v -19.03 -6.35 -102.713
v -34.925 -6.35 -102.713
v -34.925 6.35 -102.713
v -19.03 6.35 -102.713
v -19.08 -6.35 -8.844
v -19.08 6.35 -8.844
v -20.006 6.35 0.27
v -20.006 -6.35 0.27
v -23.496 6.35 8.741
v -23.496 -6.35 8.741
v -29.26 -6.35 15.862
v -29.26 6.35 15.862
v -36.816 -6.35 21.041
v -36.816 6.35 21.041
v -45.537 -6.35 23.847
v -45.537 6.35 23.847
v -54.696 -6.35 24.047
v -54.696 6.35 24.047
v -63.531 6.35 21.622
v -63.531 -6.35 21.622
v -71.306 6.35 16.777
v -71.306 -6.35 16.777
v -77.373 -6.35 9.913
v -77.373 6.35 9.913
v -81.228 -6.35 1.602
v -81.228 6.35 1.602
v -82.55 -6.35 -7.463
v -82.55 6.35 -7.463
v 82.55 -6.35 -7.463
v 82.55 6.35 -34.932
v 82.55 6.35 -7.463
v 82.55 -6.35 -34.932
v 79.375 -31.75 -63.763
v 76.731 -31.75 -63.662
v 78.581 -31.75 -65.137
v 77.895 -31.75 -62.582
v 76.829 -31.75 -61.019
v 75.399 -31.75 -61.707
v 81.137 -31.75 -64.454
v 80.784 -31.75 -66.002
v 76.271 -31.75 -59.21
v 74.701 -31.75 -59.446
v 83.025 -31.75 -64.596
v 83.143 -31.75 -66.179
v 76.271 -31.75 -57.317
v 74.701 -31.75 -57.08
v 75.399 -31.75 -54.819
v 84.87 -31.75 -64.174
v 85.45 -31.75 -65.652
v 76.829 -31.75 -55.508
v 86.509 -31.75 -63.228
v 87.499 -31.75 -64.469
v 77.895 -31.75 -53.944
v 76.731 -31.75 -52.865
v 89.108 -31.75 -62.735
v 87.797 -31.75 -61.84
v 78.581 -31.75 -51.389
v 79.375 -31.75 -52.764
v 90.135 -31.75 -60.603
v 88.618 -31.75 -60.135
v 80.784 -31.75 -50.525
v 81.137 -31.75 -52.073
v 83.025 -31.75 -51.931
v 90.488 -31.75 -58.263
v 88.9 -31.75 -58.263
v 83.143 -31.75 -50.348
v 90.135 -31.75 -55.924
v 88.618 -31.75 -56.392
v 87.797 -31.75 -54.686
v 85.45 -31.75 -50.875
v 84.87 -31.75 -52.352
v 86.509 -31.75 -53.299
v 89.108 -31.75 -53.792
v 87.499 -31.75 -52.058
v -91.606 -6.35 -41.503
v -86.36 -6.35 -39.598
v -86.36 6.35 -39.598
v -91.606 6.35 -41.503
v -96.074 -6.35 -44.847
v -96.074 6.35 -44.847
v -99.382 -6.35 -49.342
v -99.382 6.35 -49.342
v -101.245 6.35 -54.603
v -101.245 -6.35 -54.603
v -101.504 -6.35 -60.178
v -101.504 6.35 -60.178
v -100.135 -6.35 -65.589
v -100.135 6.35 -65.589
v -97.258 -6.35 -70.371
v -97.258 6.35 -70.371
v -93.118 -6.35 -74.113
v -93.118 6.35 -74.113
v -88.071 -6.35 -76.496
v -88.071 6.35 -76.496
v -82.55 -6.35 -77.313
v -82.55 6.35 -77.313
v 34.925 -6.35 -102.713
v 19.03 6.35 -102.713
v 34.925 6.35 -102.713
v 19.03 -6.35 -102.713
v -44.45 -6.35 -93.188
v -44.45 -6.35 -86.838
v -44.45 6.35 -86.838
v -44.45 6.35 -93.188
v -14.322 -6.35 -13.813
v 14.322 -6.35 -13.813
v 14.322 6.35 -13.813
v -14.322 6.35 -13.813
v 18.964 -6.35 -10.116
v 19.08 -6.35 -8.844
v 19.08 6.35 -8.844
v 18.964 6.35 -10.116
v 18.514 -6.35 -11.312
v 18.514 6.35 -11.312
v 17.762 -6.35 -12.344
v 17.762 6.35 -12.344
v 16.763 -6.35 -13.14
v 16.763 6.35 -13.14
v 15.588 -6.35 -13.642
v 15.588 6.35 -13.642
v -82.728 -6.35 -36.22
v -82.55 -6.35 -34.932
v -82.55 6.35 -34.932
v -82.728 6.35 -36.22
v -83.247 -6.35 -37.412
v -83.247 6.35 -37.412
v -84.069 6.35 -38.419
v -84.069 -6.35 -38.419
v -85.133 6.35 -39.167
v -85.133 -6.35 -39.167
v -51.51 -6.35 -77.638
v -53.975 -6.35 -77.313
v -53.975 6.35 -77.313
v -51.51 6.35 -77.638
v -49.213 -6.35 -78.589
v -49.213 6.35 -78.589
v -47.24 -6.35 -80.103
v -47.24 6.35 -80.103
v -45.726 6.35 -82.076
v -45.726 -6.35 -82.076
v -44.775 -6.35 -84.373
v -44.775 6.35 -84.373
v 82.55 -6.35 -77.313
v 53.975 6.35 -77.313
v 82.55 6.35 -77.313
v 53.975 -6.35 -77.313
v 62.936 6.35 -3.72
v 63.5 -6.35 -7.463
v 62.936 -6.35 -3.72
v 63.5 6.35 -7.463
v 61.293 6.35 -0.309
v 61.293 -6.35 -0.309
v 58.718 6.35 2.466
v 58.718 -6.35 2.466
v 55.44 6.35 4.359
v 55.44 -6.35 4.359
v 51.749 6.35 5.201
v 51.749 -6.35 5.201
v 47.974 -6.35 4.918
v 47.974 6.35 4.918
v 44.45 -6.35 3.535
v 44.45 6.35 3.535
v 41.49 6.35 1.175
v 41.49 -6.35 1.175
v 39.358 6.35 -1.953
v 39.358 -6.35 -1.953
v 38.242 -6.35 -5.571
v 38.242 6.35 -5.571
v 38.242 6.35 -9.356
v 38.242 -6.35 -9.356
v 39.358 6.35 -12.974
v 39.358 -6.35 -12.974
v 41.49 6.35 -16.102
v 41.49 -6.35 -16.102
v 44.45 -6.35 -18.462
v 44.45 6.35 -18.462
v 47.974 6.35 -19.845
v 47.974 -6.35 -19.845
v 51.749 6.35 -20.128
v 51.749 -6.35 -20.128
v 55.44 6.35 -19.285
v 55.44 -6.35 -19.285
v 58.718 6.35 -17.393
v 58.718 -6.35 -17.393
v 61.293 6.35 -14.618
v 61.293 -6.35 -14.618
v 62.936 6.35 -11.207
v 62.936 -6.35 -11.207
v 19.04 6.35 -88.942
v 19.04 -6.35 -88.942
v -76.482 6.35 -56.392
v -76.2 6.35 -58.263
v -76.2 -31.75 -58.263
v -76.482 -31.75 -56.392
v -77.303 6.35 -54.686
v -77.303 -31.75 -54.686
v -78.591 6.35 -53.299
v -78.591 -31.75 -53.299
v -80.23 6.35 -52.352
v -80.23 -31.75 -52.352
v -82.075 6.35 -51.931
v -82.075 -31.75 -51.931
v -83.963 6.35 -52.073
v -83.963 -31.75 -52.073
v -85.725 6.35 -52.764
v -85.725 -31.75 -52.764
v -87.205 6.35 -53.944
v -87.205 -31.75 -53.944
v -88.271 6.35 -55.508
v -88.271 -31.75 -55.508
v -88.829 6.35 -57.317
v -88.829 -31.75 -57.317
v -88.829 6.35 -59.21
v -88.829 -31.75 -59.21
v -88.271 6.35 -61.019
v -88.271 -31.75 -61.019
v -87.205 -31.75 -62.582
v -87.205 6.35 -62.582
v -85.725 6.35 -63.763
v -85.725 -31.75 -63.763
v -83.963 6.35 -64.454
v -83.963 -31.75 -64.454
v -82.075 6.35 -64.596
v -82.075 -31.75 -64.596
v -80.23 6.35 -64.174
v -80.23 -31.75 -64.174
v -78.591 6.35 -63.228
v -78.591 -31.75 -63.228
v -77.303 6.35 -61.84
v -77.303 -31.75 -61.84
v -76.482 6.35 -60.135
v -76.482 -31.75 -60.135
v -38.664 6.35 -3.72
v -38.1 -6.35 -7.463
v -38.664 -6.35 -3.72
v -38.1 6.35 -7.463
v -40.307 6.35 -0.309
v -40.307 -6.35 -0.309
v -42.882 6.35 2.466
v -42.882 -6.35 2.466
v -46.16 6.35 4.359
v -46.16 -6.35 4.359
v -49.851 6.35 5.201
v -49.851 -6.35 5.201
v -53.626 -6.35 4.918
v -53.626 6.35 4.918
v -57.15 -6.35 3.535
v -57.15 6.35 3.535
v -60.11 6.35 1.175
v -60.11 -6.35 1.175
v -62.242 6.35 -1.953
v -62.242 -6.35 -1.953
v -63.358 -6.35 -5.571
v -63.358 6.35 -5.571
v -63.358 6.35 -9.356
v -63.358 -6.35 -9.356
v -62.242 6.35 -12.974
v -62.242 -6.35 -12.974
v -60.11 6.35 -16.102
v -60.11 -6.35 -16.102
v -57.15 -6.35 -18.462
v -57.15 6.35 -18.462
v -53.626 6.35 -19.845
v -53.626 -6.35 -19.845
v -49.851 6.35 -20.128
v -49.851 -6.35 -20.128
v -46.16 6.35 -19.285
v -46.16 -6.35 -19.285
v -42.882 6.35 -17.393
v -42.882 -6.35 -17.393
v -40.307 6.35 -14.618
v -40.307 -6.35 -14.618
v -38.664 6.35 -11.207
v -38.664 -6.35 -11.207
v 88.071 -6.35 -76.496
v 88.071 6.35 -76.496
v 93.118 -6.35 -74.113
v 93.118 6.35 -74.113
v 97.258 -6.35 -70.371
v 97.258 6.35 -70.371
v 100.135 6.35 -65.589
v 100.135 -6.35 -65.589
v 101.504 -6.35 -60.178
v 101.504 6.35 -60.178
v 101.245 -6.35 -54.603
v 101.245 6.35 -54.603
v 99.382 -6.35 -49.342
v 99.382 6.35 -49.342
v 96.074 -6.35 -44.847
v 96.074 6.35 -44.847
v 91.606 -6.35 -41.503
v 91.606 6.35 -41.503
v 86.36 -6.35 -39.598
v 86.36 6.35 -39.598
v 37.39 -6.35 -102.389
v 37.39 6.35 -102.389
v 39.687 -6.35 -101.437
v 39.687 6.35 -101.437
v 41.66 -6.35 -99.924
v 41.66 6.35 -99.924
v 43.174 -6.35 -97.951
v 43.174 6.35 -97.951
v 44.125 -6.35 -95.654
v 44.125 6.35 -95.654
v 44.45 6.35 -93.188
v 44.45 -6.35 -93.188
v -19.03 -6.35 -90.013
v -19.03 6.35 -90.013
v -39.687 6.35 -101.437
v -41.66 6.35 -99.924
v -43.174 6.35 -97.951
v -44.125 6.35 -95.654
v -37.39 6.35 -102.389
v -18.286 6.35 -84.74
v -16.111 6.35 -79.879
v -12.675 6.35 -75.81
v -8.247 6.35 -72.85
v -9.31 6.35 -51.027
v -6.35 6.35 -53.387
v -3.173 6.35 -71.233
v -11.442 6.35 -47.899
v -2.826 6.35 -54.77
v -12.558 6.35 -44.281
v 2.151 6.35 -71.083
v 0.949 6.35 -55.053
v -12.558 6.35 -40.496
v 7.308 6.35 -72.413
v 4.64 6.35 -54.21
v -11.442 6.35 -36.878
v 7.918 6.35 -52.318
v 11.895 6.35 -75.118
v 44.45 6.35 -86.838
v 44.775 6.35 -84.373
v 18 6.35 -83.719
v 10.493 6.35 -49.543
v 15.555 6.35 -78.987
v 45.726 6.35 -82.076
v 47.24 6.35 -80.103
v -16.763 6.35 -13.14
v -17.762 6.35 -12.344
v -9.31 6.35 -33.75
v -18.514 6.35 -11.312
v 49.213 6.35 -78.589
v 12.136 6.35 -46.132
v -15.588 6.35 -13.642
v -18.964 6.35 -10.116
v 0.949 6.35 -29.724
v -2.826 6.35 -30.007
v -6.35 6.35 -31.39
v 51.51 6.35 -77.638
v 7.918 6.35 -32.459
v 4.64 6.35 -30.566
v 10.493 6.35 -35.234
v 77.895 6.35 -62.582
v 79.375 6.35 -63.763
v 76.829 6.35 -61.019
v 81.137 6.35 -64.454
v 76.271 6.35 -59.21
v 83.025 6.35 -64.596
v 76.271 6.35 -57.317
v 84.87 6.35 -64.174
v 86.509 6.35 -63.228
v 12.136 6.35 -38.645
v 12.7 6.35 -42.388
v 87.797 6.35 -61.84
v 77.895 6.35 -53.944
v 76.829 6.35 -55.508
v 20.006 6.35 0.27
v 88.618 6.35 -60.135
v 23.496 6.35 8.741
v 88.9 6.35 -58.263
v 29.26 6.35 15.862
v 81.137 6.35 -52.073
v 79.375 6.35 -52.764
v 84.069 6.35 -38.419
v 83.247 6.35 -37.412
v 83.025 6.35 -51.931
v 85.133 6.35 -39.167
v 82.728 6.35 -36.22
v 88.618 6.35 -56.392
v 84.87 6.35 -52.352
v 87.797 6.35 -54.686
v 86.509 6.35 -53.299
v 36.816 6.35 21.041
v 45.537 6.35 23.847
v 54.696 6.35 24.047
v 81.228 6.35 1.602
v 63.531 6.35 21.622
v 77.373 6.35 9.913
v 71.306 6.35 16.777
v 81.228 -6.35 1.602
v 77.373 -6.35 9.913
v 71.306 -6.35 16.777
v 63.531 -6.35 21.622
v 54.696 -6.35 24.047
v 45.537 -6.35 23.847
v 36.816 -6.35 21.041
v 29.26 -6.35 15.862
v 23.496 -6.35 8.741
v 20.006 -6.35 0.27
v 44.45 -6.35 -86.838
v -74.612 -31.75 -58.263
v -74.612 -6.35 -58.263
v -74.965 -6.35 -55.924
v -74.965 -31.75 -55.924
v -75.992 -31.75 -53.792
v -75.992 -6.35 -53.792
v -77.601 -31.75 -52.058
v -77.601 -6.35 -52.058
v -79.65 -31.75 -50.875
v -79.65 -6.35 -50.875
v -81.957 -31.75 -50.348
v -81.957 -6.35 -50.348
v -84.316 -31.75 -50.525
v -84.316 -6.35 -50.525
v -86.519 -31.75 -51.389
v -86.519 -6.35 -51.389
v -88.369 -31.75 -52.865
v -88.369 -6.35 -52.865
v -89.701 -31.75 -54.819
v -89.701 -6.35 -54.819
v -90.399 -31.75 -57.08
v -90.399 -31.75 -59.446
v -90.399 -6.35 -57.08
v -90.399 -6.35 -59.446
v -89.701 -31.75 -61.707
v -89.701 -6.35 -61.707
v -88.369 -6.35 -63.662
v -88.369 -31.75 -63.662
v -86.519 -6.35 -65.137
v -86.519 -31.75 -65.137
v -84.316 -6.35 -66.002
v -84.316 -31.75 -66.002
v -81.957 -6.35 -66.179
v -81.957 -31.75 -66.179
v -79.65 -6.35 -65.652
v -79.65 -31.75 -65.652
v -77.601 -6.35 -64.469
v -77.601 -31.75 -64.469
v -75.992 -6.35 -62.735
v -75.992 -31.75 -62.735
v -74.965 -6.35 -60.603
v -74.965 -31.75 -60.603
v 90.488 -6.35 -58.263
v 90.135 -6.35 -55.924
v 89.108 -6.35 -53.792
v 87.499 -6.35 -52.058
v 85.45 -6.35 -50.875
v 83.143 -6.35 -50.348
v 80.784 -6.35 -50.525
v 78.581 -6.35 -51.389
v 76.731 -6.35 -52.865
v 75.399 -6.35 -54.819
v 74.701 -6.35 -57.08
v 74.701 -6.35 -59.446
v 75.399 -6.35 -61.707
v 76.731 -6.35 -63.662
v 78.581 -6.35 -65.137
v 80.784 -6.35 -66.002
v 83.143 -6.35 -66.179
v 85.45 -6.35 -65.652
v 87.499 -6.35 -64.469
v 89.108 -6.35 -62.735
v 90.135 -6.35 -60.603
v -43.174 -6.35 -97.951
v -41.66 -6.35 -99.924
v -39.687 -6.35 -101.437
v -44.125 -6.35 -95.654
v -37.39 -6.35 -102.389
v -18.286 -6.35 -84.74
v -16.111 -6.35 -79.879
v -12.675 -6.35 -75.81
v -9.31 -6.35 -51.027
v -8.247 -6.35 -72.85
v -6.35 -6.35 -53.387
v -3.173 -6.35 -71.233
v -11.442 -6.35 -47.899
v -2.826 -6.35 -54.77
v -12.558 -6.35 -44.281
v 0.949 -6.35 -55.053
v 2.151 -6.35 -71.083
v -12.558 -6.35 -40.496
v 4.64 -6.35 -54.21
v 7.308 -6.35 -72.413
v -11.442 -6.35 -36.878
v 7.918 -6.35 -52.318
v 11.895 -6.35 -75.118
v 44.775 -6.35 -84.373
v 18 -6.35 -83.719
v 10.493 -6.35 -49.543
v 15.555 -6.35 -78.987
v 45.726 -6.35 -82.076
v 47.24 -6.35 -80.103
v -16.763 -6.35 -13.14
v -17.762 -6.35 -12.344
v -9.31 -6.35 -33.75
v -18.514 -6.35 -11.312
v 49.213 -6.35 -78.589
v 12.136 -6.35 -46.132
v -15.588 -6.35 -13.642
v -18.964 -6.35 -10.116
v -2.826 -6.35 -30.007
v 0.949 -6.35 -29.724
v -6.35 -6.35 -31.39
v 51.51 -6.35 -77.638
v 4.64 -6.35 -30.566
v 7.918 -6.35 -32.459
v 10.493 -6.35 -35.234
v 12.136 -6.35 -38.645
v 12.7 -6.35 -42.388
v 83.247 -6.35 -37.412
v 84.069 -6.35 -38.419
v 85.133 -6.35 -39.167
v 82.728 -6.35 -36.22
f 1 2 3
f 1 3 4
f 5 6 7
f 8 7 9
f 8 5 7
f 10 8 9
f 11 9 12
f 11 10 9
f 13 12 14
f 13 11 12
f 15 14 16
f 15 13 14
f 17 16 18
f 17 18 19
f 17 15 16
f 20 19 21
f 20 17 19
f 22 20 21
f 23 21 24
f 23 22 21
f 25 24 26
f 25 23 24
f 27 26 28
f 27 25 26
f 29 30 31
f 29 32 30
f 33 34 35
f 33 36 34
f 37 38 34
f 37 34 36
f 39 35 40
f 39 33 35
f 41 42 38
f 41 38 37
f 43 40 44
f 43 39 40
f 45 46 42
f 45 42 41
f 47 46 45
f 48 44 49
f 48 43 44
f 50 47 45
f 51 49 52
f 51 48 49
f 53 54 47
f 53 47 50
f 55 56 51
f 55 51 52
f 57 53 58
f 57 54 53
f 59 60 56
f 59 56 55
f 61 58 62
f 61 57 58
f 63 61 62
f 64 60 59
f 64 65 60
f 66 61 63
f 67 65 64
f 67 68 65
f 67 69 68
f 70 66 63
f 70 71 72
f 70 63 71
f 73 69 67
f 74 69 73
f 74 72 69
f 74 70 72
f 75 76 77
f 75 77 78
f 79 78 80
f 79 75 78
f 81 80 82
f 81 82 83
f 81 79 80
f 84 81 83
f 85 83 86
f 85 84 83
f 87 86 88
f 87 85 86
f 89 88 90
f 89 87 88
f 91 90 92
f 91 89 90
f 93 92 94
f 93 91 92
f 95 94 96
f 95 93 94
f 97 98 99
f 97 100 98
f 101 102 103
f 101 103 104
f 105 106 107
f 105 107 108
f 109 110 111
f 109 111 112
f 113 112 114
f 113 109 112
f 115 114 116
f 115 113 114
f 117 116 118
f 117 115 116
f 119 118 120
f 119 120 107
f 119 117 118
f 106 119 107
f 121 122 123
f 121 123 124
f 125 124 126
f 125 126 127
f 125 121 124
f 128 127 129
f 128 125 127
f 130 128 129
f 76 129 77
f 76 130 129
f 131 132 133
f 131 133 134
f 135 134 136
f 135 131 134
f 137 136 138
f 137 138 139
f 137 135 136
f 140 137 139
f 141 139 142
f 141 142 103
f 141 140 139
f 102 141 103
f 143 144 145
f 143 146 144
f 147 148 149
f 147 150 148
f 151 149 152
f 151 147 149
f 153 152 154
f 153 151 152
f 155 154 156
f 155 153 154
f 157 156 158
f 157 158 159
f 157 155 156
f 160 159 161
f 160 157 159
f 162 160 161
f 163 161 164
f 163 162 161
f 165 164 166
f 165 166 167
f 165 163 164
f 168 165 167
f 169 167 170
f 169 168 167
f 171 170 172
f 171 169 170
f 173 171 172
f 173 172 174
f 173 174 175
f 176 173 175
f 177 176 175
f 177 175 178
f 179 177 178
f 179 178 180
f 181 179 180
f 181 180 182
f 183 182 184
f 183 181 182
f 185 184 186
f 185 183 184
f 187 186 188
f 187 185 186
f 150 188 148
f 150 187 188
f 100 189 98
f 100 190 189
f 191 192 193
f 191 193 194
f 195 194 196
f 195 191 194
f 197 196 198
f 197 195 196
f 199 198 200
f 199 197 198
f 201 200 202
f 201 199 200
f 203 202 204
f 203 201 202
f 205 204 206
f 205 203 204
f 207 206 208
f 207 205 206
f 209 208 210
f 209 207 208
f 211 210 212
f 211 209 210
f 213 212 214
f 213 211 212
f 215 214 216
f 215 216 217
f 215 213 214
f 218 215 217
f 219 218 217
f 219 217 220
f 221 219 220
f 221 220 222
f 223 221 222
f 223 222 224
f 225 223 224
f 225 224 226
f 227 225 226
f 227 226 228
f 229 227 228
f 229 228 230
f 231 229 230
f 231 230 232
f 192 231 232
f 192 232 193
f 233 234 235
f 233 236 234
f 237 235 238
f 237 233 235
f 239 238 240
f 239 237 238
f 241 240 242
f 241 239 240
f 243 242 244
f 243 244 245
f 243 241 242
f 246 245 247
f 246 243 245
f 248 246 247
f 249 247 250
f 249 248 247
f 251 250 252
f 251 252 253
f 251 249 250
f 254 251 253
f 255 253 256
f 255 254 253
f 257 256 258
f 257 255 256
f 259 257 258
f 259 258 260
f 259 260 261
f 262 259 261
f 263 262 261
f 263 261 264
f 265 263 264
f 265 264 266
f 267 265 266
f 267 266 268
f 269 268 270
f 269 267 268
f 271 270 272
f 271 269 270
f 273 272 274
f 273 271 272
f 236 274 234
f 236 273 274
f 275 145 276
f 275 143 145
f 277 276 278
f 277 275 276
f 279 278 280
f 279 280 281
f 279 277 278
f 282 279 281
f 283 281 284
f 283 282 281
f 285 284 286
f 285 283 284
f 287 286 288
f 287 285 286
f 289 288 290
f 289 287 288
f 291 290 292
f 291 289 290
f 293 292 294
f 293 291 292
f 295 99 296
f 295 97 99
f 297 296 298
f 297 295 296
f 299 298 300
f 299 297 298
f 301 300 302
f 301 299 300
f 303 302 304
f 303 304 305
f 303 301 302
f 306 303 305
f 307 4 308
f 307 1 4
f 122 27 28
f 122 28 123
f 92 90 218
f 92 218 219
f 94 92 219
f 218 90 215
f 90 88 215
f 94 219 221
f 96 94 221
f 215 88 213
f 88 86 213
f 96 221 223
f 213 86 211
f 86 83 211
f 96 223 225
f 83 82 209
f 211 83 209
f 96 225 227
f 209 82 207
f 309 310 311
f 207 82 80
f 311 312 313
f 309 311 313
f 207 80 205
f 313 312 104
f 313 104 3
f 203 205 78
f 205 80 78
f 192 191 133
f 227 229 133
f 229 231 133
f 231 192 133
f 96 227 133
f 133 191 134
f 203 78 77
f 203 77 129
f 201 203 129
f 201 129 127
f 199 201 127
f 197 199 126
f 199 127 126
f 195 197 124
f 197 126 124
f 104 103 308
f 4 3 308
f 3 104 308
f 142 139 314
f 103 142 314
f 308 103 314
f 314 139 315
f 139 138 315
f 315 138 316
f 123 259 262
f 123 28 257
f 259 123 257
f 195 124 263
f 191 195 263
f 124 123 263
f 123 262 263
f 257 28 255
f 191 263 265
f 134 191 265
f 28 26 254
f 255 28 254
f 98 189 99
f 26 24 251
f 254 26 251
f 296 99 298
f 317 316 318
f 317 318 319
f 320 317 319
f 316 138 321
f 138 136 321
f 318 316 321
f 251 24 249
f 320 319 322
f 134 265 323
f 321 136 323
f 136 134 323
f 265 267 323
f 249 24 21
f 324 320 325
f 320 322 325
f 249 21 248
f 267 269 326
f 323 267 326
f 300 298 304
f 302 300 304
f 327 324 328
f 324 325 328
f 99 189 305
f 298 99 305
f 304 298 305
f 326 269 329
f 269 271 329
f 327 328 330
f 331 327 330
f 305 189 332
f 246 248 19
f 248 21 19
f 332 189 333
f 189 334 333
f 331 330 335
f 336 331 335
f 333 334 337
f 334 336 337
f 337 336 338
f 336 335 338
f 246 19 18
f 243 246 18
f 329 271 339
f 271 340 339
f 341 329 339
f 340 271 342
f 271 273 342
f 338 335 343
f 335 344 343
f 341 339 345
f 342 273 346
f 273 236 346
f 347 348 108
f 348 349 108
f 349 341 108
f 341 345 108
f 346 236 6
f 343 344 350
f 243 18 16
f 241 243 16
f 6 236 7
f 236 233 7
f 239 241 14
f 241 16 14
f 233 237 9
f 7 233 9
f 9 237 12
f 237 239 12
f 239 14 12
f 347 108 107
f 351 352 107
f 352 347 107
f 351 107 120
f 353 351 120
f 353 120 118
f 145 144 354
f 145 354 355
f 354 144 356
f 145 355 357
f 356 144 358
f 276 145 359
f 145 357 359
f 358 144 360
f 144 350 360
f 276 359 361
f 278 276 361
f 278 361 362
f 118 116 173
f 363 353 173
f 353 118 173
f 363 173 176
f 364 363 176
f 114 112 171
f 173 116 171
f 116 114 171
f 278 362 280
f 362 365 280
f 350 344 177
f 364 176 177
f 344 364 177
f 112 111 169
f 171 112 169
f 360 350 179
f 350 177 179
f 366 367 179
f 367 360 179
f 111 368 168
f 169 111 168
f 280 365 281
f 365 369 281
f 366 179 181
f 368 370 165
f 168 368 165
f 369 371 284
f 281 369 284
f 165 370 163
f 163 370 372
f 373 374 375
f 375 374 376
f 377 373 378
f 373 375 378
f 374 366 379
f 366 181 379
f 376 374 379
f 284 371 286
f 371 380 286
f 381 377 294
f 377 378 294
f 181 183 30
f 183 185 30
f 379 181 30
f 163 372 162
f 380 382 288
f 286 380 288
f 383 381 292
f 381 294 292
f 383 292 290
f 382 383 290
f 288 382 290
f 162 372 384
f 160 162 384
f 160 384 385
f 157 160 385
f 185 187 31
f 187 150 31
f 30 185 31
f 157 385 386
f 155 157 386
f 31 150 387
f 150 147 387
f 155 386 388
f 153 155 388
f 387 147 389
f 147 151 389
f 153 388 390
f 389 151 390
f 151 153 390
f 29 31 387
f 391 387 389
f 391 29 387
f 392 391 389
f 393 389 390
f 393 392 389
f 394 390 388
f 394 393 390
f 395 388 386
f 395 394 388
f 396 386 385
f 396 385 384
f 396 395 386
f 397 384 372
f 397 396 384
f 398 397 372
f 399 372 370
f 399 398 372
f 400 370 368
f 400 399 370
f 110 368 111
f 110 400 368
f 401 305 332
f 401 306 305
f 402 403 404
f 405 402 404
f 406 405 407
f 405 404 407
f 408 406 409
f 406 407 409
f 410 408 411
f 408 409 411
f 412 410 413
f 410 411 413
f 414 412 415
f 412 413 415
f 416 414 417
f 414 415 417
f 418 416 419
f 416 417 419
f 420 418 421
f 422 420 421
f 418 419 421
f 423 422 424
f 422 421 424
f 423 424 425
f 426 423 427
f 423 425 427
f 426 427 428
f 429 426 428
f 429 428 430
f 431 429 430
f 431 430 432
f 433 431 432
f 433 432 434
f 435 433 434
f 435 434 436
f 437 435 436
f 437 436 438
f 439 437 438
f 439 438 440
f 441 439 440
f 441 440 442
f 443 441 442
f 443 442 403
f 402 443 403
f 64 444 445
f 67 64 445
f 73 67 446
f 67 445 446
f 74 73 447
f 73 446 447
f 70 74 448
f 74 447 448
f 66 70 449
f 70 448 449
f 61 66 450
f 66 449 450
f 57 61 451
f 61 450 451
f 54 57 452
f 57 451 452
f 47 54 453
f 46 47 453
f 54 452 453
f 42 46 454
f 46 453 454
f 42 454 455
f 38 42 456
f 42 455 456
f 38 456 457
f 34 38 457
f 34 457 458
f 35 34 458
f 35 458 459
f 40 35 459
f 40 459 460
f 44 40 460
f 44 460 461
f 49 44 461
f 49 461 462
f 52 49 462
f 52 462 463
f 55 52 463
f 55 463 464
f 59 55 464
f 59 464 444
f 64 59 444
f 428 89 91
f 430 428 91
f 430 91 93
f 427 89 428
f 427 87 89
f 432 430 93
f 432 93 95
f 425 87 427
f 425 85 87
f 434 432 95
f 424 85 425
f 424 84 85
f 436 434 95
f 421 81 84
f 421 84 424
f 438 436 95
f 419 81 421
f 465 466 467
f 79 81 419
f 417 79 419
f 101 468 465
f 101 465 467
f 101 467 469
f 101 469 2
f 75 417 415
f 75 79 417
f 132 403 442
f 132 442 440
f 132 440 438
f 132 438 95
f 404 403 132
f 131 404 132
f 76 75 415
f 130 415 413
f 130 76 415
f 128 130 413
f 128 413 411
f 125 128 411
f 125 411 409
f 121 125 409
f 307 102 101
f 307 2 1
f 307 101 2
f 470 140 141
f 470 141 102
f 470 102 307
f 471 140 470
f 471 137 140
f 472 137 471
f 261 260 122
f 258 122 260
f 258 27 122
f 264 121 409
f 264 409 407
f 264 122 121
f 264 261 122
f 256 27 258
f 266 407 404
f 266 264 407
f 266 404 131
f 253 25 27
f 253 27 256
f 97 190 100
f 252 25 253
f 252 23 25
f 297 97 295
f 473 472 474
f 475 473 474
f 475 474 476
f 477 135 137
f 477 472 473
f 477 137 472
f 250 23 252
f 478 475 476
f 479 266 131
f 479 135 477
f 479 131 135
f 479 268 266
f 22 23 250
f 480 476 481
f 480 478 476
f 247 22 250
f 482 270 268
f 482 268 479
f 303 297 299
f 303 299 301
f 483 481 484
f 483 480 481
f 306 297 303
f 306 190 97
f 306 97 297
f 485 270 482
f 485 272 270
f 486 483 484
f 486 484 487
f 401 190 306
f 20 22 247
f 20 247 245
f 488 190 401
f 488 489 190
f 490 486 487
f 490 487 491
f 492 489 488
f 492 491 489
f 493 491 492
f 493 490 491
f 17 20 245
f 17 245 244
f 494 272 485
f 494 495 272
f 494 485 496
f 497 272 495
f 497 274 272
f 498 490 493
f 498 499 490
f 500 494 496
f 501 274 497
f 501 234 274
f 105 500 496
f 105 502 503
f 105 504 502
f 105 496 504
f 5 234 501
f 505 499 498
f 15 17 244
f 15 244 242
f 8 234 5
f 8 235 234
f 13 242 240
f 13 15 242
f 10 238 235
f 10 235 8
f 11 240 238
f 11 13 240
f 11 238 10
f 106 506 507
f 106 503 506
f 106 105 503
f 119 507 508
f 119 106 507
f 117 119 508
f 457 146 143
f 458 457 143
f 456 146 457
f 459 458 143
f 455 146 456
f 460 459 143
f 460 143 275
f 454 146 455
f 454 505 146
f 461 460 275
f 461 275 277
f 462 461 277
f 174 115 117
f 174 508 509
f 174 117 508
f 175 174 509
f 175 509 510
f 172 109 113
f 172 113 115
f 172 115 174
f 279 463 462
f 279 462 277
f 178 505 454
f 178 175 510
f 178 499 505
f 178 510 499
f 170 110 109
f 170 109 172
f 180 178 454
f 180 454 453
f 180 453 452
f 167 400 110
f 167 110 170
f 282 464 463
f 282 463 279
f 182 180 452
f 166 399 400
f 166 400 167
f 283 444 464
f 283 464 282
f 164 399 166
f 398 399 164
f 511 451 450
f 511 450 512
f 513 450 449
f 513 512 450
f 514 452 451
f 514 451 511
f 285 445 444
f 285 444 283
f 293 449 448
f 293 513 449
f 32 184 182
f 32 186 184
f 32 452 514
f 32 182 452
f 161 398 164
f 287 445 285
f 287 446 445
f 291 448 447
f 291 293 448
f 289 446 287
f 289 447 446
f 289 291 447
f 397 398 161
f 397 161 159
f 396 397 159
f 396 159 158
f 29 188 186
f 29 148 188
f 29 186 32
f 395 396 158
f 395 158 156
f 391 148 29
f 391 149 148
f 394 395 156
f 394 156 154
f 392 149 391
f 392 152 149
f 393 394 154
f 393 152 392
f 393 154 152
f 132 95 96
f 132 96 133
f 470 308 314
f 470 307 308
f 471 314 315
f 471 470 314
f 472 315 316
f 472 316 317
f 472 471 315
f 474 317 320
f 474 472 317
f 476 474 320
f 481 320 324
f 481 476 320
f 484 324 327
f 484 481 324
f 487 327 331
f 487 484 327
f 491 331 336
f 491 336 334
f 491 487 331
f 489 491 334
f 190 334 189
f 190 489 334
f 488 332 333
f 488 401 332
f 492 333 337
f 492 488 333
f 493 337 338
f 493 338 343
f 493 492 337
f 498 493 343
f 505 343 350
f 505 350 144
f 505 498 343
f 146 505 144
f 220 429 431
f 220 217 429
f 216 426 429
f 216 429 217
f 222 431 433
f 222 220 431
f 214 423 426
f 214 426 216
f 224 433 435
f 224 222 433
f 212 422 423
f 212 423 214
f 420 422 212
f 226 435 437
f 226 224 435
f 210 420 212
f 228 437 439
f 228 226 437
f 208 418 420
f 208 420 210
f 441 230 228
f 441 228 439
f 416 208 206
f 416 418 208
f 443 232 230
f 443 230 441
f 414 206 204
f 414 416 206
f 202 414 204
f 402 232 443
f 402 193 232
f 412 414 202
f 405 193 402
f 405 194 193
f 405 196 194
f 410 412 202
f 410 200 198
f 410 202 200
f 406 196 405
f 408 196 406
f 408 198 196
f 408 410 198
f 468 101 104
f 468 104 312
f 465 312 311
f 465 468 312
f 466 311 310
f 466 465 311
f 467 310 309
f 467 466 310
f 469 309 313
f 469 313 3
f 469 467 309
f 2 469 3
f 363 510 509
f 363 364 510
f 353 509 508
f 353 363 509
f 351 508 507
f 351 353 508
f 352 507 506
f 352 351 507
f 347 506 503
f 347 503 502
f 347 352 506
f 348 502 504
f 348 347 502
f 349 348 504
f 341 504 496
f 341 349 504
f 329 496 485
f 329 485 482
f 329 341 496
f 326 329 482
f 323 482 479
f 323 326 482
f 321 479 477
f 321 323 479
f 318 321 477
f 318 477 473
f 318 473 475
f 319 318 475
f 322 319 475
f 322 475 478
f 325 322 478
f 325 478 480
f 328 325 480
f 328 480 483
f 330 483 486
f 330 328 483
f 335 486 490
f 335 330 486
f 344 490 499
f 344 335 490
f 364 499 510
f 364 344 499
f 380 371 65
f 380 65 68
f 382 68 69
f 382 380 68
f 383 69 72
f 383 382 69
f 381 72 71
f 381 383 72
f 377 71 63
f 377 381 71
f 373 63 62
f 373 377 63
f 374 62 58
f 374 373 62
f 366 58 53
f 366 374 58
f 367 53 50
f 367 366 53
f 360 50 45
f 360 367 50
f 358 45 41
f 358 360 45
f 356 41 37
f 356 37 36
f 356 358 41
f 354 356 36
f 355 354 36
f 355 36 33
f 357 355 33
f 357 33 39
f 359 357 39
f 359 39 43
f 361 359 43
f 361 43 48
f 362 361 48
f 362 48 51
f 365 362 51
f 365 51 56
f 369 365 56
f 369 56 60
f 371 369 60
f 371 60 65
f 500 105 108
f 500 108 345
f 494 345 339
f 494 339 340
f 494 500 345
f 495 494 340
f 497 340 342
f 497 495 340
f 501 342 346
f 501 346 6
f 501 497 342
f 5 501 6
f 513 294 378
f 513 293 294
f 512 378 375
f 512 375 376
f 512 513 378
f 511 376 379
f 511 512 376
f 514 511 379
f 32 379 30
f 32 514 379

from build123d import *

# Parameters (mm, degrees)
F0_R     = 7.9375
F0_R_2   = 12.7
F0_R_3   = 6.35
F1_DEPTH = 6.35
F2_DEPTH = 31.75


with BuildPart() as f1:
    # F0 (on Front) → F1 (new body, symmetric)
    with BuildSketch(Plane.XZ):
        with BuildLine():
            ThreePointArc((82.55, -7.463384), (50.109619, 24.279109), (19.080024, -8.843819))
            ThreePointArc((19.080024, -8.843819), (17.762053, -12.344458), (14.322027, -13.813384))
            Line((14.322027, -13.813384), (0, -13.813384))
            Line((0, -13.813384), (-14.322027, -13.813384))
            ThreePointArc((-14.322027, -13.813384), (-17.762053, -12.344458), (-19.080024, -8.843819))
            ThreePointArc((-19.080024, -8.843819), (-50.109619, 24.279109), (-82.55, -7.463384))
            Line((-82.55, -7.463384), (-82.55, -34.931994))
            ThreePointArc((-82.55, -34.931994), (-83.623483, -37.944063), (-86.36, -39.598272))
            ThreePointArc((-86.36, -39.598272), (-101.503534, -60.17808), (-82.55, -77.313384))
            Line((-82.55, -77.313384), (-53.975, -77.313384))
            ThreePointArc((-53.975, -77.313384), (-47.239808, -80.103192), (-44.45, -86.838384))
            Line((-44.45, -86.838384), (-44.45, -93.188384))
            ThreePointArc((-44.45, -93.188384), (-41.660192, -99.923576), (-34.925, -102.713384))
            Line((-34.925, -102.713384), (-19.030211, -102.713384))
            Line((-19.030211, -102.713384), (-19.030211, -90.013384))
            ThreePointArc((-19.030211, -90.013384), (-0.516209, -70.970926), (19.039627, -88.941812))
            Line((19.039627, -88.941812), (19.030211, -102.713384))
            Line((19.030211, -102.713384), (34.925, -102.713384))
            ThreePointArc((34.925, -102.713384), (41.660192, -99.923576), (44.45, -93.188384))
            Line((44.45, -93.188384), (44.45, -86.838384))
            ThreePointArc((44.45, -86.838384), (47.239808, -80.103192), (53.975, -77.313384))
            Line((53.975, -77.313384), (82.55, -77.313384))
            ThreePointArc((82.55, -77.313384), (101.503534, -60.17808), (86.36, -39.598272))
            ThreePointArc((86.36, -39.598272), (83.623483, -37.944063), (82.55, -34.931994))
            Line((82.55, -34.931994), (82.55, -7.463384))
        make_face()
        with Locations((-82.55, -58.263384)):
            Circle(F0_R, mode=Mode.SUBTRACT)
        with Locations((0, -42.388384)):
            Circle(F0_R_2, mode=Mode.SUBTRACT)
        with Locations((82.55, -58.263384)):
            Circle(F0_R, mode=Mode.SUBTRACT)
        with Locations((-50.8, -7.463384)):
            Circle(F0_R_2, mode=Mode.SUBTRACT)
        with Locations((50.8, -7.463384)):
            Circle(F0_R_2, mode=Mode.SUBTRACT)
        with Locations((82.55, -58.263384)):
            Circle(F0_R)
        with Locations((82.55, -58.263384)):
            Circle(F0_R_3, mode=Mode.SUBTRACT)
        with Locations((-82.55, -58.263384)):
            Circle(F0_R)
        with Locations((-82.55, -58.263384)):
            Circle(F0_R_3, mode=Mode.SUBTRACT)
    extrude(amount=F1_DEPTH, both=True)

    # F0 (on Front) → F2 (join)
    with BuildSketch(Plane.XZ):
        with Locations((-82.55, -58.263384)):
            Circle(F0_R)
        with Locations((-82.55, -58.263384)):
            Circle(F0_R_3, mode=Mode.SUBTRACT)
        with Locations((82.55, -58.263384)):
            Circle(F0_R)
        with Locations((82.55, -58.263384)):
            Circle(F0_R_3, mode=Mode.SUBTRACT)
    extrude(amount=F2_DEPTH)


solid = f1.part
